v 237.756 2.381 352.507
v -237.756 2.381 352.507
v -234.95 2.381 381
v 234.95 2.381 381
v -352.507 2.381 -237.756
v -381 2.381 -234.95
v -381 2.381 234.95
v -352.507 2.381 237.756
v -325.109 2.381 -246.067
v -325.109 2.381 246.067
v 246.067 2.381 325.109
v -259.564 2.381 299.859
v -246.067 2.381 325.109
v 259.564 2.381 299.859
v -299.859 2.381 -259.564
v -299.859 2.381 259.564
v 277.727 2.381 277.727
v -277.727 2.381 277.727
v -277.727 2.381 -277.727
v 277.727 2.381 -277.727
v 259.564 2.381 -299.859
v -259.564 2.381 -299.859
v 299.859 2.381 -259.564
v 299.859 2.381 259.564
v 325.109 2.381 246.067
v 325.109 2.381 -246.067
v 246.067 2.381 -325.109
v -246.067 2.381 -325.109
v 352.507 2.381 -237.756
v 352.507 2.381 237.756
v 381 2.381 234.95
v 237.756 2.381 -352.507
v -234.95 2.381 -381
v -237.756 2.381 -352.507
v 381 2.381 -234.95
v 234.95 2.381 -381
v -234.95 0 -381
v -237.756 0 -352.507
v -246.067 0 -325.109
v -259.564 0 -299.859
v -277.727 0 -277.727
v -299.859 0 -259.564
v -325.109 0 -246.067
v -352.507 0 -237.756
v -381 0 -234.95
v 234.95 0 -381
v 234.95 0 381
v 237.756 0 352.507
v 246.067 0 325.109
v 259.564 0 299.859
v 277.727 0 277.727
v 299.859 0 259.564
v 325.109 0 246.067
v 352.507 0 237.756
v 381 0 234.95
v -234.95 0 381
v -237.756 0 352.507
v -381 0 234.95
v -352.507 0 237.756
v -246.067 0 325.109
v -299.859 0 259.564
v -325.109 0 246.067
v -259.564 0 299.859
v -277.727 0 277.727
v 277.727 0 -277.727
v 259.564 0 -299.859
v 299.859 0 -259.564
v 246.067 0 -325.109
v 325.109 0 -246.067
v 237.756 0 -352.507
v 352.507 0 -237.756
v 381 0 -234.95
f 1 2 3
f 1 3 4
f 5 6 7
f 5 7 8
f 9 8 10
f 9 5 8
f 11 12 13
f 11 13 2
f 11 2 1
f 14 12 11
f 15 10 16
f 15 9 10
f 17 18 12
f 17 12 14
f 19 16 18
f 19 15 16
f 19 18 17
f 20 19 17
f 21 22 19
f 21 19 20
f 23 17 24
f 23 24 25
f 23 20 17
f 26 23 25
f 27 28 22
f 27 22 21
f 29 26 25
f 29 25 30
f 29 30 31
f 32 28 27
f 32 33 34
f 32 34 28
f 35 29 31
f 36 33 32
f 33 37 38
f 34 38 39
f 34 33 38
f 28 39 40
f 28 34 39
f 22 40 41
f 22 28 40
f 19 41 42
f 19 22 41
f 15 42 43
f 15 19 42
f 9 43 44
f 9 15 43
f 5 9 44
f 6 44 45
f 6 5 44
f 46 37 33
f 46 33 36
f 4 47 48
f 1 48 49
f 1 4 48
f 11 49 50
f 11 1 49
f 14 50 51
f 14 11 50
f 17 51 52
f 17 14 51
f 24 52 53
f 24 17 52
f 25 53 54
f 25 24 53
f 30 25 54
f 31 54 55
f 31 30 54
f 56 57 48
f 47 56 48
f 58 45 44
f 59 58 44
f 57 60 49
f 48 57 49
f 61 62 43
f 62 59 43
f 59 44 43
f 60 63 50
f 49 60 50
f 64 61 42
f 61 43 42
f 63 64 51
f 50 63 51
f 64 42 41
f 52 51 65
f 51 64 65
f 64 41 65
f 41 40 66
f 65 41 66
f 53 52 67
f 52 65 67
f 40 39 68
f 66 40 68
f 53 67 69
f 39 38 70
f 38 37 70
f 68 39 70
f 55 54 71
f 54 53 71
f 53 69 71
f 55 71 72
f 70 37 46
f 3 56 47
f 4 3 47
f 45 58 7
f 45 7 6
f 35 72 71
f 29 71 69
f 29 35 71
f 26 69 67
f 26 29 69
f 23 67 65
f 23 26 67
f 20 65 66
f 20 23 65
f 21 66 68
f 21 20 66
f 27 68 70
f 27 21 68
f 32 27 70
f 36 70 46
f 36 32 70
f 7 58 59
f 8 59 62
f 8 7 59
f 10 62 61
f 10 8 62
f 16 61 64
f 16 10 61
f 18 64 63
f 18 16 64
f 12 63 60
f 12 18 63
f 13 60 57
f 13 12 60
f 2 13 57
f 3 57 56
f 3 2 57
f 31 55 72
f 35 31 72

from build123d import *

# Parameters (mm, degrees)
SKETCH1_W           = 762
SKETCH1_H           = 762
BOSS_EXTRUDE1_DEPTH = 2.38125
CUT_EXTRUDE1_DEPTH  = 3.38125


with BuildPart() as part:
    # Sketch1 → Boss-Extrude1 (new body)
    with BuildSketch(Plane(origin=(0, 0, 0), x_dir=(1, 0, 0), z_dir=(0, 1, 0))):
        Rectangle(SKETCH1_W, SKETCH1_H)
    extrude(amount=BOSS_EXTRUDE1_DEPTH)

    # Sketch2 → Cut-Extrude1 (cut, through all)
    with BuildSketch(Plane(origin=(0, 2.38125, 0), x_dir=(1, 0, 0), z_dir=(0, 1, 0))):
        with BuildLine():
            Line((234.95, 381), (381, 381))
            Line((381, 381), (381, 234.95))
            ThreePointArc((381, 234.95), (277.727054608, 277.727054608), (234.95, 381))
        make_face()
        with BuildLine():
            Line((381, -234.95), (381, -381))
            Line((381, -381), (234.95, -381))
            ThreePointArc((234.95, -381), (277.727054608, -277.727054608), (381, -234.95))
        make_face()
        with BuildLine():
            Line((-234.95, -381), (-381, -381))
            Line((-381, -381), (-381, -234.95))
            ThreePointArc((-381, -234.95), (-277.727054608, -277.727054608), (-234.95, -381))
        make_face()
        with BuildLine():
            Line((-381, 234.95), (-381, 381))
            Line((-381, 381), (-234.95, 381))
            ThreePointArc((-234.95, 381), (-277.727054608, 277.727054608), (-381, 234.95))
        make_face()
    extrude(amount=-CUT_EXTRUDE1_DEPTH, mode=Mode.SUBTRACT)


solid = part.part
